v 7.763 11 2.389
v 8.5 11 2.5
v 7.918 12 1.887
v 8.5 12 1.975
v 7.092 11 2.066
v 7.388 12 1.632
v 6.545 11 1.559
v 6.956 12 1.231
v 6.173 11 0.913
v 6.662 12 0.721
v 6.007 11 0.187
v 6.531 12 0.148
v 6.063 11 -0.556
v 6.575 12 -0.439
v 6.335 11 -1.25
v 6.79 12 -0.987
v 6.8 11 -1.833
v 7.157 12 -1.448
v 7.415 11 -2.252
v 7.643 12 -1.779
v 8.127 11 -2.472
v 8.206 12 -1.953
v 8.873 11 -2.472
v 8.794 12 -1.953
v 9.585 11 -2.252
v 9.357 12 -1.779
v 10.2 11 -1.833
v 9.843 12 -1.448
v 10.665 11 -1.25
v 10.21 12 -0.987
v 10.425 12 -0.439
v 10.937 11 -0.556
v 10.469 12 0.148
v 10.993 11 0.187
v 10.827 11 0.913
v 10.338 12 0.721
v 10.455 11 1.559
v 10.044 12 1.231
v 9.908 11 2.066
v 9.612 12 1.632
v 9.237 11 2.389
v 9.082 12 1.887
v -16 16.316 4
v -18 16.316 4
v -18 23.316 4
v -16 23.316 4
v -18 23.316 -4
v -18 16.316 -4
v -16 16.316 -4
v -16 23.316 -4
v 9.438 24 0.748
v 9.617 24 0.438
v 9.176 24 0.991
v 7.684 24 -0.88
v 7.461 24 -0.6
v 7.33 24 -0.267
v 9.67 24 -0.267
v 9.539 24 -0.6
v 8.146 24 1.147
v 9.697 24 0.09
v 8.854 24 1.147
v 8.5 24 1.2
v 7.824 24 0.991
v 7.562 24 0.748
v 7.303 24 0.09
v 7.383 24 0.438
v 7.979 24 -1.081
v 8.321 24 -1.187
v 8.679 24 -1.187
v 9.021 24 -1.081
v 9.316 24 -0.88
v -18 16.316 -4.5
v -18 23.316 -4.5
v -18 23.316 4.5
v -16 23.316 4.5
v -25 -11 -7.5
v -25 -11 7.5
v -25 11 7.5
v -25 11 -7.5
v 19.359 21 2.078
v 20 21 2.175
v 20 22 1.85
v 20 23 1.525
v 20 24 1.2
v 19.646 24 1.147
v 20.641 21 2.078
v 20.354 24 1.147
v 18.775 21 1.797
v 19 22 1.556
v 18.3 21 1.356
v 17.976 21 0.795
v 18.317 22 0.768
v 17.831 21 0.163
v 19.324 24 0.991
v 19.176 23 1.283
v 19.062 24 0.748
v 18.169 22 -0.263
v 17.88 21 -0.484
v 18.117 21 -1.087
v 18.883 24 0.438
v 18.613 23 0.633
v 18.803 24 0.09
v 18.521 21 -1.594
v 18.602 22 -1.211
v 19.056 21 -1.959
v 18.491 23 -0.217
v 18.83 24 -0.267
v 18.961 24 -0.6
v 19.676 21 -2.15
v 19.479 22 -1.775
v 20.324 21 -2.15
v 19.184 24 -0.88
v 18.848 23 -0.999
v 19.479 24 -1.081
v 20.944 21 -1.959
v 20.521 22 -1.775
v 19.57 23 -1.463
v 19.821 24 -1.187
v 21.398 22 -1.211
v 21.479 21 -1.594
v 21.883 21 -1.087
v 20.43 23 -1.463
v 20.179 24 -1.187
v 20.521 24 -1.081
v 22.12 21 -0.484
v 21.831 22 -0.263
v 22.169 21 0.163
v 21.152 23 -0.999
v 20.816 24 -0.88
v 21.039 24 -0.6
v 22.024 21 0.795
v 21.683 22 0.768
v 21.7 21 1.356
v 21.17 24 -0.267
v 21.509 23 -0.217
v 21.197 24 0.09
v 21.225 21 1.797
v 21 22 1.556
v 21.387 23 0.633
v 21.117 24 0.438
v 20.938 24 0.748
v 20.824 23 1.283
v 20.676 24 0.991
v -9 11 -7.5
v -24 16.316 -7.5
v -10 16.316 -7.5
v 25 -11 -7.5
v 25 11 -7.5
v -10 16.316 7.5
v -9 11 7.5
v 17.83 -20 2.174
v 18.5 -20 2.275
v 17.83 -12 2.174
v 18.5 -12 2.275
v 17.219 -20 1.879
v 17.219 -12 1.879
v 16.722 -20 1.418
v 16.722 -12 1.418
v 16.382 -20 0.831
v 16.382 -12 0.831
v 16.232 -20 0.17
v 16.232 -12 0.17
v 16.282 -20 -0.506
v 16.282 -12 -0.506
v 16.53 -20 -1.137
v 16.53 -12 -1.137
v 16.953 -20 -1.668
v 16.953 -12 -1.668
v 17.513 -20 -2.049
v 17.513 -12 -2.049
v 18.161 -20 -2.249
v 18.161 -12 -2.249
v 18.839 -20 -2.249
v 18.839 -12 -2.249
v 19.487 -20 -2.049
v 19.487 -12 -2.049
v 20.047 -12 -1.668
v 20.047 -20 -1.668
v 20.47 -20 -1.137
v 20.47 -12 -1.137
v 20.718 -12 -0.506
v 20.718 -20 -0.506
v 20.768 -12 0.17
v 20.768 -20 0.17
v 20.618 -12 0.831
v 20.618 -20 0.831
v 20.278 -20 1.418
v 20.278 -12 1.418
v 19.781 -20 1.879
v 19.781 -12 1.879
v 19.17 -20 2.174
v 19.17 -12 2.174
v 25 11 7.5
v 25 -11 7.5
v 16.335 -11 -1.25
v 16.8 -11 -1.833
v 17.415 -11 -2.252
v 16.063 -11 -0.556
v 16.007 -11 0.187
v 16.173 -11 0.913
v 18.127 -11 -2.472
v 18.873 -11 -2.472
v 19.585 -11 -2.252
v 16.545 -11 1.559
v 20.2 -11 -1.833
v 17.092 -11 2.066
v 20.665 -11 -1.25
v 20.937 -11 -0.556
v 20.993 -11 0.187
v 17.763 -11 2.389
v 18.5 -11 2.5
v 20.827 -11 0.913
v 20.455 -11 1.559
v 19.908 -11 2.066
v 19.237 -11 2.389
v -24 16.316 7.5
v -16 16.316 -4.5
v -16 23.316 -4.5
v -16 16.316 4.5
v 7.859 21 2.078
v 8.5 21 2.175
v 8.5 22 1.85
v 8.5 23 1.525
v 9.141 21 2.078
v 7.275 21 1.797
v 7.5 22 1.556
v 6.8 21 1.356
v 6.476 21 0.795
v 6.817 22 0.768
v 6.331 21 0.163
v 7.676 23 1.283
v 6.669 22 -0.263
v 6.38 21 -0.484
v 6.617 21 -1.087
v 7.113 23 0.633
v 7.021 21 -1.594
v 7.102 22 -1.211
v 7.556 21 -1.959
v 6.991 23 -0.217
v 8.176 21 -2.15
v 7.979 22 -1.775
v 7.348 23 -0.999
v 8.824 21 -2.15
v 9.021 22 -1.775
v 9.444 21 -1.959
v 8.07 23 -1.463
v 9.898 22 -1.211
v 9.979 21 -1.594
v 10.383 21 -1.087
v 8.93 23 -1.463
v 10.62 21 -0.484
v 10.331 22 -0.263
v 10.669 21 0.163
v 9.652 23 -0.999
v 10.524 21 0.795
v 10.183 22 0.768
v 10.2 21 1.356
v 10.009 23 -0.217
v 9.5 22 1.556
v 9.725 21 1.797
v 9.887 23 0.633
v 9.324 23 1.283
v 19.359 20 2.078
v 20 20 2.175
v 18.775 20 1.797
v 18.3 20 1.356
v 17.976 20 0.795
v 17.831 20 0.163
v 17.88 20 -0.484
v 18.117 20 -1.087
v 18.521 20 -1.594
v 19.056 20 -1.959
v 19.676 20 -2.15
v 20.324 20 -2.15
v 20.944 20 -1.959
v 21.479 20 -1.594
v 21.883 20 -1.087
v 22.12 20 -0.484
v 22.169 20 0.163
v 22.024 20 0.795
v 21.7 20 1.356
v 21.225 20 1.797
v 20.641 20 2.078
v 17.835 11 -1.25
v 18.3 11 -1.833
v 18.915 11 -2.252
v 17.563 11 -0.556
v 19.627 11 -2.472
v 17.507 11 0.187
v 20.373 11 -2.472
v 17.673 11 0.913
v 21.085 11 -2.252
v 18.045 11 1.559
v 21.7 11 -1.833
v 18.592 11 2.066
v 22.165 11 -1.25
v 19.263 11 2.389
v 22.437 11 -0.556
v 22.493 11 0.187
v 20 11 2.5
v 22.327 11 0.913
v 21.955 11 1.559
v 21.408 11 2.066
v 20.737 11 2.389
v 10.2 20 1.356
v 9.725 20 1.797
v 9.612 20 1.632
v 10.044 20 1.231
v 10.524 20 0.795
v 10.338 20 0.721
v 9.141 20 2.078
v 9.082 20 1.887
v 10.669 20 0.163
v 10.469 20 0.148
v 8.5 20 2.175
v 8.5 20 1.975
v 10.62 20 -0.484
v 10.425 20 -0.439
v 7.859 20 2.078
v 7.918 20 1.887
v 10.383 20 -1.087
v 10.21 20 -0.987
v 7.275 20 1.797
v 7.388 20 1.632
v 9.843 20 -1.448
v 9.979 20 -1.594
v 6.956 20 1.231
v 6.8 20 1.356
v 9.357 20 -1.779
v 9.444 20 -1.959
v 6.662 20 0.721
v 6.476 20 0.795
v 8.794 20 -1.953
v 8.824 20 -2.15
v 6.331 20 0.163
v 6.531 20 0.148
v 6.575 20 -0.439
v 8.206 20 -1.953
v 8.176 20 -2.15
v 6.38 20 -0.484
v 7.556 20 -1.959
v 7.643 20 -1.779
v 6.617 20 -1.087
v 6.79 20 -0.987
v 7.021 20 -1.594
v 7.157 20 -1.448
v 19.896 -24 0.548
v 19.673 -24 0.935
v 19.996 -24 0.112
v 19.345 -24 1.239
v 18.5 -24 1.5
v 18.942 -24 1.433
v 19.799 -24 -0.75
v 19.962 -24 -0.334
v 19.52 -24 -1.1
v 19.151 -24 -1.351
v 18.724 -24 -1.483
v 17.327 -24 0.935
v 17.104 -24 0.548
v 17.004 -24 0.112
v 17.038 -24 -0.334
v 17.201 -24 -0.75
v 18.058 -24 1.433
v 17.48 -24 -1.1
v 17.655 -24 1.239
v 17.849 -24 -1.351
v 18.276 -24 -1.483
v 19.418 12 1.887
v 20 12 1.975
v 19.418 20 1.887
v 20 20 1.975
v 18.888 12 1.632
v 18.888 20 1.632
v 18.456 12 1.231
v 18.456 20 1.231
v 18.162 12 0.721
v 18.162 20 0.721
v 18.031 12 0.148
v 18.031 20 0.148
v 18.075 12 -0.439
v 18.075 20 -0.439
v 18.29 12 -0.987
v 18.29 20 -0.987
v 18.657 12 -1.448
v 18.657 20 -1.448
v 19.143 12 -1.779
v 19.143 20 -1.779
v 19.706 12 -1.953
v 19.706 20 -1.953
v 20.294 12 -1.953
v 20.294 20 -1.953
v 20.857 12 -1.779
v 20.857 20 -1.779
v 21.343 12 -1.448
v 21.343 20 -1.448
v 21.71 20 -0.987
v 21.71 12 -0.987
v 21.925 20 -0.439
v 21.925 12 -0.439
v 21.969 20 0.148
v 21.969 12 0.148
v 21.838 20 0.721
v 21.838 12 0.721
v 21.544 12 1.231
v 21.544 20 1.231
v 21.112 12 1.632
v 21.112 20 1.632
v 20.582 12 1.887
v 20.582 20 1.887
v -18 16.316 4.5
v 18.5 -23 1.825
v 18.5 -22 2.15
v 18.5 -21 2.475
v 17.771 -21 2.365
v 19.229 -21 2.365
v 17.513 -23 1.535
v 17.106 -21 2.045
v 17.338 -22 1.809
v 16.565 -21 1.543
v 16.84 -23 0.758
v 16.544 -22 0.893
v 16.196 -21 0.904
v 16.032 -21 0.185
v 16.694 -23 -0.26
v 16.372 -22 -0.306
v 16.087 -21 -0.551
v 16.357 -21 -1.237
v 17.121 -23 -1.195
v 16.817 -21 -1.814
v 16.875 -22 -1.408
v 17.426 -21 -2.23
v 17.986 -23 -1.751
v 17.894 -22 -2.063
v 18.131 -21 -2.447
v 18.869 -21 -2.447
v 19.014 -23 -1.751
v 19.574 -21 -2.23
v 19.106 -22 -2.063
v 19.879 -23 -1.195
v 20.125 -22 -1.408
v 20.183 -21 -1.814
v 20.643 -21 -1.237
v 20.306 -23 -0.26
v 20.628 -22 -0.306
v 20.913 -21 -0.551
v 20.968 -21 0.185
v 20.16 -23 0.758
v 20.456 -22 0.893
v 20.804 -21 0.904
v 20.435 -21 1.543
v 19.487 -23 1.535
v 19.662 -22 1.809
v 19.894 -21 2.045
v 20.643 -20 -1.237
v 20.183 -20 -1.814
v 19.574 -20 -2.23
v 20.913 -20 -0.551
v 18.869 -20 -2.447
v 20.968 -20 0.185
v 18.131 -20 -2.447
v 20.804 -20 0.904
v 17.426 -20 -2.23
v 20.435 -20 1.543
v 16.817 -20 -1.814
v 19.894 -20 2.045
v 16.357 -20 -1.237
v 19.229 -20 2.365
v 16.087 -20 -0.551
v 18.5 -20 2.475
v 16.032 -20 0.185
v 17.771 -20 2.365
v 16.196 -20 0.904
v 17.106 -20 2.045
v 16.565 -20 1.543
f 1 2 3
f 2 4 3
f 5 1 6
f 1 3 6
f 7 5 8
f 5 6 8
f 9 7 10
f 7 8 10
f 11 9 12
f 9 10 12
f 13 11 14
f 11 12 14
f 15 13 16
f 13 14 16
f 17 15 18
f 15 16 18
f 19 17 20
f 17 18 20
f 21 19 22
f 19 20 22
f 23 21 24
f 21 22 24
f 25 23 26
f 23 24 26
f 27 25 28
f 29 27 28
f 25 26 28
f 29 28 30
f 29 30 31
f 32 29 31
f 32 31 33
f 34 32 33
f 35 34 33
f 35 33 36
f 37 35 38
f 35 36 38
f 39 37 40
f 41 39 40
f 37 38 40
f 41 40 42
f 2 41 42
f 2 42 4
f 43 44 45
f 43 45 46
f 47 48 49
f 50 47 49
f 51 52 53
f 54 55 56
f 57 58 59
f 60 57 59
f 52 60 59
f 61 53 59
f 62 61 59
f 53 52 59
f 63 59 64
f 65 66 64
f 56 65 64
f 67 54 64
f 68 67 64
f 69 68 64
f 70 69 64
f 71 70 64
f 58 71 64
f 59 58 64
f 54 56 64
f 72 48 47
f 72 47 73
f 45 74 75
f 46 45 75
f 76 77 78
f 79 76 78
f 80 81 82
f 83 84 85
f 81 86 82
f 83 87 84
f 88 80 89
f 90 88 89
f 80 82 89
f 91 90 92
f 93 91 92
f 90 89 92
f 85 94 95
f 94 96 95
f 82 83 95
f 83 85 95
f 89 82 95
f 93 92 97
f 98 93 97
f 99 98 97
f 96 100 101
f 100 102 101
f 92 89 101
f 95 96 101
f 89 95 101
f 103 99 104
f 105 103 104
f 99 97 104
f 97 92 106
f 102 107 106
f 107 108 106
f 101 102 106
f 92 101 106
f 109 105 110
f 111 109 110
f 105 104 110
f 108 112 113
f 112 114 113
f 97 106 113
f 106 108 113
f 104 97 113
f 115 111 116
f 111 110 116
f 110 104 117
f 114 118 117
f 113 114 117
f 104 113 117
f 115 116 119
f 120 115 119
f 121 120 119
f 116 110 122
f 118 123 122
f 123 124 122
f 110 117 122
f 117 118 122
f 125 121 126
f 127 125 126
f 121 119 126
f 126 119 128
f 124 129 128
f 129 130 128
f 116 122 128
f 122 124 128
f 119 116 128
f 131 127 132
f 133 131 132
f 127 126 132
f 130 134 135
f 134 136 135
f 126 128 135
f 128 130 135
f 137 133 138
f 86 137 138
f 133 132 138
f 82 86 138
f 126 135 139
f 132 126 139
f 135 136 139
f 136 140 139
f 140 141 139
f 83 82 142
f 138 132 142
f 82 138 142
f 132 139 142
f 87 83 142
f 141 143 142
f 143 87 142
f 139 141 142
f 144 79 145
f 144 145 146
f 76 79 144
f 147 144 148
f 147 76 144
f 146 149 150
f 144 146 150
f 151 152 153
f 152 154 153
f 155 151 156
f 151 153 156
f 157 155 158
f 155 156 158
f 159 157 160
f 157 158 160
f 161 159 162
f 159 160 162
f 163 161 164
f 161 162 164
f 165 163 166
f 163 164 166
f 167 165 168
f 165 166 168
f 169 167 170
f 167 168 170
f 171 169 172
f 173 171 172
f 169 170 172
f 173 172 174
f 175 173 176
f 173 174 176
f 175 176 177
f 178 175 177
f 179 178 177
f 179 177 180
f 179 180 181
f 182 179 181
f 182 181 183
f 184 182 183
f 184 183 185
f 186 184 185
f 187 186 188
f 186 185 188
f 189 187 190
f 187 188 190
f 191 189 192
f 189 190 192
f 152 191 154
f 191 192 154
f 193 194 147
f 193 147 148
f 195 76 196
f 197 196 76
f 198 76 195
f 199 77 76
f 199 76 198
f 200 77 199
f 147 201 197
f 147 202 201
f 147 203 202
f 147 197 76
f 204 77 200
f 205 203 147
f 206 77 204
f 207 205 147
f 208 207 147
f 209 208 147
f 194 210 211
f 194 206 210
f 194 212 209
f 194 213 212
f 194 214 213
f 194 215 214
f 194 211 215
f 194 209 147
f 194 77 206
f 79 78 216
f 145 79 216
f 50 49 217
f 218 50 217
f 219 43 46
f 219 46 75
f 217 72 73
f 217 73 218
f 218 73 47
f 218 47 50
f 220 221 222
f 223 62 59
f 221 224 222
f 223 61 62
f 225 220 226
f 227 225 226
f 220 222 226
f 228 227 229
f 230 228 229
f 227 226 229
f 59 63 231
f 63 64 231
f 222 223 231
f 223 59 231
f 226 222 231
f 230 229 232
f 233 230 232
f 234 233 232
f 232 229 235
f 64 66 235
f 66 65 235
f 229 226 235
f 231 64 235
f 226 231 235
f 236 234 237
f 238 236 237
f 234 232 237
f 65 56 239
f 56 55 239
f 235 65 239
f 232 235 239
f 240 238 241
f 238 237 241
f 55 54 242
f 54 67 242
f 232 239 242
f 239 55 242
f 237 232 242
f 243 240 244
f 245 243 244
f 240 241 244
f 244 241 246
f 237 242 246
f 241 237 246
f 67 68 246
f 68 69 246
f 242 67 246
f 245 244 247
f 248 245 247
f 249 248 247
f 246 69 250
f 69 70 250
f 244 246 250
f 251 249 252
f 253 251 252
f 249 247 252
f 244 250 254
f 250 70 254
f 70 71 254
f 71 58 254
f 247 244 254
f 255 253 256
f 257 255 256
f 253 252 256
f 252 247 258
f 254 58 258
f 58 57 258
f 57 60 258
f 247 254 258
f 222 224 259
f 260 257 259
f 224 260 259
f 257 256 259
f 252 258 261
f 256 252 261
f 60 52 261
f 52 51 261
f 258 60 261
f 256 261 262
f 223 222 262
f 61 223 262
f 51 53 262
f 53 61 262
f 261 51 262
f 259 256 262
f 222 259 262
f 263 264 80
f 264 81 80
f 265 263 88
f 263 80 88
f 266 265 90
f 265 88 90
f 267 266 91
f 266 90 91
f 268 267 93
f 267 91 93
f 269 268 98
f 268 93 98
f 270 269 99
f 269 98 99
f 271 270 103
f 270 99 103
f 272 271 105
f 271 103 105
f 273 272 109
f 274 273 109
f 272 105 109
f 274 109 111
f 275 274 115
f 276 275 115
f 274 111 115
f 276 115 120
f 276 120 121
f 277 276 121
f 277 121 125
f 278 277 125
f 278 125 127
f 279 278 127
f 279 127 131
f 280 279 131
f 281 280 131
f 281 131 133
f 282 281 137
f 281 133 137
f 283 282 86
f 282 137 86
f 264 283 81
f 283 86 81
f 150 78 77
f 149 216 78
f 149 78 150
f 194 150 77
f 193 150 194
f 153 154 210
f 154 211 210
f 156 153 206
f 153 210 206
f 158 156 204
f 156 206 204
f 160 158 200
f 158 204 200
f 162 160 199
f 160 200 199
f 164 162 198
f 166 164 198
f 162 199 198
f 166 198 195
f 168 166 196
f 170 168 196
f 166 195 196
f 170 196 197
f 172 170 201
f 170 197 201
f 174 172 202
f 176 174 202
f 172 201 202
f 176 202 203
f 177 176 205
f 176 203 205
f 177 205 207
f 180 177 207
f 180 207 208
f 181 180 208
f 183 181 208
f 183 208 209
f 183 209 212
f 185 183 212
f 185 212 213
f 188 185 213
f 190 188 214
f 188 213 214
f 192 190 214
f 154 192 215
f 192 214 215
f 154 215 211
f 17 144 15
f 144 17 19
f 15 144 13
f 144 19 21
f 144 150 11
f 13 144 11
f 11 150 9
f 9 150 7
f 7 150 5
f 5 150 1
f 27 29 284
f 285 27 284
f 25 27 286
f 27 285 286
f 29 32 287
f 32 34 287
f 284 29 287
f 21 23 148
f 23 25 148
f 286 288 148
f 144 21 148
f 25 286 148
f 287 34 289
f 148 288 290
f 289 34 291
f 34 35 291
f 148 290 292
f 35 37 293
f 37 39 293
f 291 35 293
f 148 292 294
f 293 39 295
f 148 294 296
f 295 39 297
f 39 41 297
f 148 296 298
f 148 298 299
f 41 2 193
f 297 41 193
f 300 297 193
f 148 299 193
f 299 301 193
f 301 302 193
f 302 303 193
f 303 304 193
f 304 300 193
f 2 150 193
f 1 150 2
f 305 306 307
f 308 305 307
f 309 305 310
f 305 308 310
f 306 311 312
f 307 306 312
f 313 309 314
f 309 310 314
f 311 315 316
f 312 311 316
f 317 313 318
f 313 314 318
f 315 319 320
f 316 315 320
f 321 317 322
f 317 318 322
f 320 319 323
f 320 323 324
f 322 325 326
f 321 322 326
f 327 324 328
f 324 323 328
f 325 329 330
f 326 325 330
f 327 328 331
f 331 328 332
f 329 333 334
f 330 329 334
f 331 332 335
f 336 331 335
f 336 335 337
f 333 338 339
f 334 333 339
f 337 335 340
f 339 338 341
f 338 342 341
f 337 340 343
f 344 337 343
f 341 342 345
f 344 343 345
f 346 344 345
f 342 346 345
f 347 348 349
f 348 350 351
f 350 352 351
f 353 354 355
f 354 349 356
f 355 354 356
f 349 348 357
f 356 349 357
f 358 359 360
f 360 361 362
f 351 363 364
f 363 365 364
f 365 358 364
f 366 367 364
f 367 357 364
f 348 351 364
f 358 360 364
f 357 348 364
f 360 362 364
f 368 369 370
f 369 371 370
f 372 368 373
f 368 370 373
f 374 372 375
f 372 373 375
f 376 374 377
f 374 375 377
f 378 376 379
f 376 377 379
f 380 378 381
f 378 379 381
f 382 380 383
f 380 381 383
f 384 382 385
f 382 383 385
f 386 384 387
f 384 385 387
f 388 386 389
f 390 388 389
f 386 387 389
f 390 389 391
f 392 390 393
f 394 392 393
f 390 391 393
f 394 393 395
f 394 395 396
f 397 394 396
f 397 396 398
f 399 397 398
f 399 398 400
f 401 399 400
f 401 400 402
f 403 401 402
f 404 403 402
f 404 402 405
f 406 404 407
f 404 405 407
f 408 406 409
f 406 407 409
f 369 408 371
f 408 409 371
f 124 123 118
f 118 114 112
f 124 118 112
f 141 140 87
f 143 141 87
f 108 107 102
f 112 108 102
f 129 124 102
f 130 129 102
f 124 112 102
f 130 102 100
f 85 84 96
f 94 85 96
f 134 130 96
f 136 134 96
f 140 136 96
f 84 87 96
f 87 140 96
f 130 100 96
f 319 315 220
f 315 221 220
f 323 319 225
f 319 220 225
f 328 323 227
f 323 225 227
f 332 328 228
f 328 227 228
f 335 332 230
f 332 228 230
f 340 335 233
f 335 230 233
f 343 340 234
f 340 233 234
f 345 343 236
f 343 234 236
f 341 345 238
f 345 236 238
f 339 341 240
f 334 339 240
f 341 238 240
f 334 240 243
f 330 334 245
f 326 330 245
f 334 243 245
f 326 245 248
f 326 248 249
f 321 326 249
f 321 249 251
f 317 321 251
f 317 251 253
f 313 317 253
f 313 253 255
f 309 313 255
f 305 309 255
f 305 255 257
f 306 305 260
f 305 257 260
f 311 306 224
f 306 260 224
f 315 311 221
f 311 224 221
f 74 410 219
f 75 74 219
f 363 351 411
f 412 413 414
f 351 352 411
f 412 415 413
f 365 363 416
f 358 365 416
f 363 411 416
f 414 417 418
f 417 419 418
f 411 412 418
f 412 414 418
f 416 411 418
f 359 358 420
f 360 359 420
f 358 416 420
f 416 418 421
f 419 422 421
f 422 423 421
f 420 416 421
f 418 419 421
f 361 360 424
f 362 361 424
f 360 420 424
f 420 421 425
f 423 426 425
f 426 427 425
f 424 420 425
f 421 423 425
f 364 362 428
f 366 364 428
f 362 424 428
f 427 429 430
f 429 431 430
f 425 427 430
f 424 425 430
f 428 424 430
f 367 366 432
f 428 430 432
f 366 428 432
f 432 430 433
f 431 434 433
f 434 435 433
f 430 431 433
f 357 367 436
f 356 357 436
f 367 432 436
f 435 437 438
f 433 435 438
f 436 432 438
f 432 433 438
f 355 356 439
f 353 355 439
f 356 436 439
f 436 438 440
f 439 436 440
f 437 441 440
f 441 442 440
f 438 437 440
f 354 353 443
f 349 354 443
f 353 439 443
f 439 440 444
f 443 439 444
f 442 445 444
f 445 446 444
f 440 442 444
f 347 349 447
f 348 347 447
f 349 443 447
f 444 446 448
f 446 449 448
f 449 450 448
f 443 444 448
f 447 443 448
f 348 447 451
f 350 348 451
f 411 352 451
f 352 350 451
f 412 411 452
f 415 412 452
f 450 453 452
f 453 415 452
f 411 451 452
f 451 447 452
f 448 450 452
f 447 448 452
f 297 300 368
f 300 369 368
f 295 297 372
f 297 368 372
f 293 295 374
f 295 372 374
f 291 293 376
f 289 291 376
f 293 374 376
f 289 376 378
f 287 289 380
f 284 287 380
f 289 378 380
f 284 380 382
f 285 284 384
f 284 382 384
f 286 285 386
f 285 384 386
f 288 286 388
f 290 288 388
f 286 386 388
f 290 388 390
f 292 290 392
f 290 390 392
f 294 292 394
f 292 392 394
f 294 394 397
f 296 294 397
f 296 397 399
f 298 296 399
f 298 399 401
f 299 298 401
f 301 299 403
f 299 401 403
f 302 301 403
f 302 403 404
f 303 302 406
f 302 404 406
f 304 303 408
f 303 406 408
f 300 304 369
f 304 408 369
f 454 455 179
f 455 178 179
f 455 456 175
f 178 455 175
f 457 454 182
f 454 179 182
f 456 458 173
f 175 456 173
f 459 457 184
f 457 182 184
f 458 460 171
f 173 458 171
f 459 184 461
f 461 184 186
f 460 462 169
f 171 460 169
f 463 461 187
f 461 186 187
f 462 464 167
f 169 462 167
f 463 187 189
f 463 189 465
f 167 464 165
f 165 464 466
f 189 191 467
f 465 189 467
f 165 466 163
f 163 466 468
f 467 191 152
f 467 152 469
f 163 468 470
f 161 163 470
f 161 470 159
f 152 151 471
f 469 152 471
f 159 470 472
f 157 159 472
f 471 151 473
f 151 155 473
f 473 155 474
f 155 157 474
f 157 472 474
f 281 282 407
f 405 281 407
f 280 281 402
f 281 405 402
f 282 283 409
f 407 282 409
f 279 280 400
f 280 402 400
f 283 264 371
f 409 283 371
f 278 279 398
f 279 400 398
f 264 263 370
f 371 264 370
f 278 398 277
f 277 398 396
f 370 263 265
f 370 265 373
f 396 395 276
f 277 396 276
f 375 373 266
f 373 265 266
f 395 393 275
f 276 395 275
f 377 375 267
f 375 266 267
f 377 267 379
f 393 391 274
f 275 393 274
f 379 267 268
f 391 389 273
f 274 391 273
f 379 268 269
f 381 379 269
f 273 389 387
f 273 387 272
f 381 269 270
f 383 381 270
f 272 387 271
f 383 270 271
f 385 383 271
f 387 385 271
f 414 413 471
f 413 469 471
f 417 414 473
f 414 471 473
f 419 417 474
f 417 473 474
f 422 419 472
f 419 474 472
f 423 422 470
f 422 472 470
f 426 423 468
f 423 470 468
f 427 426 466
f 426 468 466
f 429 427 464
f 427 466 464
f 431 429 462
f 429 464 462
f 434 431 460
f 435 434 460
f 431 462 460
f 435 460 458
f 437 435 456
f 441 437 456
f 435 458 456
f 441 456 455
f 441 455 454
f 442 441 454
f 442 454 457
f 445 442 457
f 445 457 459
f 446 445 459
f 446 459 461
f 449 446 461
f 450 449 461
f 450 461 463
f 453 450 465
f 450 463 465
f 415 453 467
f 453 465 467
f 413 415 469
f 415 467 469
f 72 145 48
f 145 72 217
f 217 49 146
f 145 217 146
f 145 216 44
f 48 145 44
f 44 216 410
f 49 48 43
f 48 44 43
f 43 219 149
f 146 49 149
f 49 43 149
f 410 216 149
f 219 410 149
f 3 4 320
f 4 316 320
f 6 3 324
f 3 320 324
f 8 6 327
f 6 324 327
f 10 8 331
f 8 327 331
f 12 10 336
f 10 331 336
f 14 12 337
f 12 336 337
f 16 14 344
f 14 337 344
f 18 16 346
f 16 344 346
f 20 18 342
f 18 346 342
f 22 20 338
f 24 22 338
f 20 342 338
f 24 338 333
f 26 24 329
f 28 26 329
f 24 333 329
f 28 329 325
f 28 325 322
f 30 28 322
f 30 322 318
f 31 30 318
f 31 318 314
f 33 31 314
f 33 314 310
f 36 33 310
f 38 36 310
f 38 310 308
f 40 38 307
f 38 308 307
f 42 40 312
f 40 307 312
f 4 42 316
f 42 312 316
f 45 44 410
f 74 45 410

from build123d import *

# Parameters (mm, degrees)
SKETCH1_W                       = 50
SKETCH1_H                       = 22
BOSS_EXTRUDE1_DEPTH             = 7.5
BOSS_EXTRUDE3_REACH             = 30.324
BOSS_EXTRUDE3_DIRECTION_2_REACH = 30.324
SKETCH9_W                       = 2
SKETCH9_H                       = 0.5
BOSS_EXTRUDE4_DEPTH             = 7


with BuildPart() as part:
    # Sketch1 → Boss-Extrude1 (new, symmetric)
    with BuildSketch(Plane.XY):
        Rectangle(SKETCH1_W, SKETCH1_H)
    extrude(amount=BOSS_EXTRUDE1_DEPTH, both=True)

    # Boss-Extrude3: up to this face of the body (flat: up to its plane)
    boss_extrude3_end = Plane(part.part.faces().sort_by_distance((0, 0, 7.5))[0])
    # Sketch3 → Boss-Extrude3 (add, up to the picked face)
    with BuildSketch(Plane.XY, mode=Mode.PRIVATE) as boss_extrude3_sk1:
        Polygon((-25, 11), (-24, 16.31597155), (-10, 16.31597155), (-9, 11), align=None)
    boss_extrude3_tool1 = split(extrude(boss_extrude3_sk1.sketch, amount=BOSS_EXTRUDE3_REACH, mode=Mode.PRIVATE), bisect_by=boss_extrude3_end, keep=Keep.BOTH, mode=Mode.PRIVATE)
    add(boss_extrude3_tool1.solids().sort_by(Axis((-17, 13.598919, 0), (0, 0, 1)))[0])

    # Boss-Extrude3 direction 2: up to this face of the body (flat: up to its plane)
    boss_extrude3_direction_2_end = Plane(part.part.faces().sort_by_distance((0, 0, -7.5))[0])
    # Sketch3 → Boss-Extrude3 direction 2 (add, up to the picked face)
    with BuildSketch(Plane.XY, mode=Mode.PRIVATE) as boss_extrude3_direction_2_sk1:
        Polygon((-25, 11), (-24, 16.31597155), (-10, 16.31597155), (-9, 11), align=None)
    boss_extrude3_direction_2_tool1 = split(extrude(boss_extrude3_direction_2_sk1.sketch, amount=-BOSS_EXTRUDE3_DIRECTION_2_REACH, mode=Mode.PRIVATE), bisect_by=boss_extrude3_direction_2_end, keep=Keep.BOTH, mode=Mode.PRIVATE)
    add(boss_extrude3_direction_2_tool1.solids().sort_by(Axis((-17, 13.598919, 0), (0, 0, -1)))[0])

    # Sketch5 → Revolve1 (revolve)
    with BuildSketch(Plane.XY):
        Polygon((8.5, 11), (11, 11), (10.474759089, 12), (10.474759089, 20), (10.674759089, 20), (10.674759089, 21), (9.7, 24), (8.5, 24), align=None)
    revolve(axis=Axis((8.5, 24, 0), (0, -1, 0)))

    # Sketch6 → Revolve2 (revolve)
    with BuildSketch(Plane.XY):
        Polygon((20, 11), (22.5, 11), (21.974759089, 12), (21.974759089, 20), (22.174759089, 20), (22.174759089, 21), (21.2, 24), (20, 24), align=None)
    revolve(axis=Axis((20, 24, 0), (0, -1, 0)))

    # Sketch8 → Revolve3 (revolve)
    with BuildSketch(Plane.XY):
        Polygon((18.5, -11), (18.5, -24), (17, -24), (16.025240911, -21), (16.025240911, -20), (16.225240911, -20), (16.225240911, -12), (16, -11), align=None)
    revolve(axis=Axis((18.5, -11, 0), (0, -1, 0)))

    # Sketch9 → Boss-Extrude4 (add)
    with BuildSketch(Plane(origin=(0, 16.31597155, 0), x_dir=(1, 0, 0), z_dir=(0, 1, 0))):
        with Locations((-17, 4.25)):
            Rectangle(SKETCH9_W, SKETCH9_H)
    boss_extrude4 = extrude(amount=BOSS_EXTRUDE4_DEPTH)

    # Mirror1: Boss-Extrude4 across plane
    add(boss_extrude4.mirror(Plane.XY))


solid = part.part
